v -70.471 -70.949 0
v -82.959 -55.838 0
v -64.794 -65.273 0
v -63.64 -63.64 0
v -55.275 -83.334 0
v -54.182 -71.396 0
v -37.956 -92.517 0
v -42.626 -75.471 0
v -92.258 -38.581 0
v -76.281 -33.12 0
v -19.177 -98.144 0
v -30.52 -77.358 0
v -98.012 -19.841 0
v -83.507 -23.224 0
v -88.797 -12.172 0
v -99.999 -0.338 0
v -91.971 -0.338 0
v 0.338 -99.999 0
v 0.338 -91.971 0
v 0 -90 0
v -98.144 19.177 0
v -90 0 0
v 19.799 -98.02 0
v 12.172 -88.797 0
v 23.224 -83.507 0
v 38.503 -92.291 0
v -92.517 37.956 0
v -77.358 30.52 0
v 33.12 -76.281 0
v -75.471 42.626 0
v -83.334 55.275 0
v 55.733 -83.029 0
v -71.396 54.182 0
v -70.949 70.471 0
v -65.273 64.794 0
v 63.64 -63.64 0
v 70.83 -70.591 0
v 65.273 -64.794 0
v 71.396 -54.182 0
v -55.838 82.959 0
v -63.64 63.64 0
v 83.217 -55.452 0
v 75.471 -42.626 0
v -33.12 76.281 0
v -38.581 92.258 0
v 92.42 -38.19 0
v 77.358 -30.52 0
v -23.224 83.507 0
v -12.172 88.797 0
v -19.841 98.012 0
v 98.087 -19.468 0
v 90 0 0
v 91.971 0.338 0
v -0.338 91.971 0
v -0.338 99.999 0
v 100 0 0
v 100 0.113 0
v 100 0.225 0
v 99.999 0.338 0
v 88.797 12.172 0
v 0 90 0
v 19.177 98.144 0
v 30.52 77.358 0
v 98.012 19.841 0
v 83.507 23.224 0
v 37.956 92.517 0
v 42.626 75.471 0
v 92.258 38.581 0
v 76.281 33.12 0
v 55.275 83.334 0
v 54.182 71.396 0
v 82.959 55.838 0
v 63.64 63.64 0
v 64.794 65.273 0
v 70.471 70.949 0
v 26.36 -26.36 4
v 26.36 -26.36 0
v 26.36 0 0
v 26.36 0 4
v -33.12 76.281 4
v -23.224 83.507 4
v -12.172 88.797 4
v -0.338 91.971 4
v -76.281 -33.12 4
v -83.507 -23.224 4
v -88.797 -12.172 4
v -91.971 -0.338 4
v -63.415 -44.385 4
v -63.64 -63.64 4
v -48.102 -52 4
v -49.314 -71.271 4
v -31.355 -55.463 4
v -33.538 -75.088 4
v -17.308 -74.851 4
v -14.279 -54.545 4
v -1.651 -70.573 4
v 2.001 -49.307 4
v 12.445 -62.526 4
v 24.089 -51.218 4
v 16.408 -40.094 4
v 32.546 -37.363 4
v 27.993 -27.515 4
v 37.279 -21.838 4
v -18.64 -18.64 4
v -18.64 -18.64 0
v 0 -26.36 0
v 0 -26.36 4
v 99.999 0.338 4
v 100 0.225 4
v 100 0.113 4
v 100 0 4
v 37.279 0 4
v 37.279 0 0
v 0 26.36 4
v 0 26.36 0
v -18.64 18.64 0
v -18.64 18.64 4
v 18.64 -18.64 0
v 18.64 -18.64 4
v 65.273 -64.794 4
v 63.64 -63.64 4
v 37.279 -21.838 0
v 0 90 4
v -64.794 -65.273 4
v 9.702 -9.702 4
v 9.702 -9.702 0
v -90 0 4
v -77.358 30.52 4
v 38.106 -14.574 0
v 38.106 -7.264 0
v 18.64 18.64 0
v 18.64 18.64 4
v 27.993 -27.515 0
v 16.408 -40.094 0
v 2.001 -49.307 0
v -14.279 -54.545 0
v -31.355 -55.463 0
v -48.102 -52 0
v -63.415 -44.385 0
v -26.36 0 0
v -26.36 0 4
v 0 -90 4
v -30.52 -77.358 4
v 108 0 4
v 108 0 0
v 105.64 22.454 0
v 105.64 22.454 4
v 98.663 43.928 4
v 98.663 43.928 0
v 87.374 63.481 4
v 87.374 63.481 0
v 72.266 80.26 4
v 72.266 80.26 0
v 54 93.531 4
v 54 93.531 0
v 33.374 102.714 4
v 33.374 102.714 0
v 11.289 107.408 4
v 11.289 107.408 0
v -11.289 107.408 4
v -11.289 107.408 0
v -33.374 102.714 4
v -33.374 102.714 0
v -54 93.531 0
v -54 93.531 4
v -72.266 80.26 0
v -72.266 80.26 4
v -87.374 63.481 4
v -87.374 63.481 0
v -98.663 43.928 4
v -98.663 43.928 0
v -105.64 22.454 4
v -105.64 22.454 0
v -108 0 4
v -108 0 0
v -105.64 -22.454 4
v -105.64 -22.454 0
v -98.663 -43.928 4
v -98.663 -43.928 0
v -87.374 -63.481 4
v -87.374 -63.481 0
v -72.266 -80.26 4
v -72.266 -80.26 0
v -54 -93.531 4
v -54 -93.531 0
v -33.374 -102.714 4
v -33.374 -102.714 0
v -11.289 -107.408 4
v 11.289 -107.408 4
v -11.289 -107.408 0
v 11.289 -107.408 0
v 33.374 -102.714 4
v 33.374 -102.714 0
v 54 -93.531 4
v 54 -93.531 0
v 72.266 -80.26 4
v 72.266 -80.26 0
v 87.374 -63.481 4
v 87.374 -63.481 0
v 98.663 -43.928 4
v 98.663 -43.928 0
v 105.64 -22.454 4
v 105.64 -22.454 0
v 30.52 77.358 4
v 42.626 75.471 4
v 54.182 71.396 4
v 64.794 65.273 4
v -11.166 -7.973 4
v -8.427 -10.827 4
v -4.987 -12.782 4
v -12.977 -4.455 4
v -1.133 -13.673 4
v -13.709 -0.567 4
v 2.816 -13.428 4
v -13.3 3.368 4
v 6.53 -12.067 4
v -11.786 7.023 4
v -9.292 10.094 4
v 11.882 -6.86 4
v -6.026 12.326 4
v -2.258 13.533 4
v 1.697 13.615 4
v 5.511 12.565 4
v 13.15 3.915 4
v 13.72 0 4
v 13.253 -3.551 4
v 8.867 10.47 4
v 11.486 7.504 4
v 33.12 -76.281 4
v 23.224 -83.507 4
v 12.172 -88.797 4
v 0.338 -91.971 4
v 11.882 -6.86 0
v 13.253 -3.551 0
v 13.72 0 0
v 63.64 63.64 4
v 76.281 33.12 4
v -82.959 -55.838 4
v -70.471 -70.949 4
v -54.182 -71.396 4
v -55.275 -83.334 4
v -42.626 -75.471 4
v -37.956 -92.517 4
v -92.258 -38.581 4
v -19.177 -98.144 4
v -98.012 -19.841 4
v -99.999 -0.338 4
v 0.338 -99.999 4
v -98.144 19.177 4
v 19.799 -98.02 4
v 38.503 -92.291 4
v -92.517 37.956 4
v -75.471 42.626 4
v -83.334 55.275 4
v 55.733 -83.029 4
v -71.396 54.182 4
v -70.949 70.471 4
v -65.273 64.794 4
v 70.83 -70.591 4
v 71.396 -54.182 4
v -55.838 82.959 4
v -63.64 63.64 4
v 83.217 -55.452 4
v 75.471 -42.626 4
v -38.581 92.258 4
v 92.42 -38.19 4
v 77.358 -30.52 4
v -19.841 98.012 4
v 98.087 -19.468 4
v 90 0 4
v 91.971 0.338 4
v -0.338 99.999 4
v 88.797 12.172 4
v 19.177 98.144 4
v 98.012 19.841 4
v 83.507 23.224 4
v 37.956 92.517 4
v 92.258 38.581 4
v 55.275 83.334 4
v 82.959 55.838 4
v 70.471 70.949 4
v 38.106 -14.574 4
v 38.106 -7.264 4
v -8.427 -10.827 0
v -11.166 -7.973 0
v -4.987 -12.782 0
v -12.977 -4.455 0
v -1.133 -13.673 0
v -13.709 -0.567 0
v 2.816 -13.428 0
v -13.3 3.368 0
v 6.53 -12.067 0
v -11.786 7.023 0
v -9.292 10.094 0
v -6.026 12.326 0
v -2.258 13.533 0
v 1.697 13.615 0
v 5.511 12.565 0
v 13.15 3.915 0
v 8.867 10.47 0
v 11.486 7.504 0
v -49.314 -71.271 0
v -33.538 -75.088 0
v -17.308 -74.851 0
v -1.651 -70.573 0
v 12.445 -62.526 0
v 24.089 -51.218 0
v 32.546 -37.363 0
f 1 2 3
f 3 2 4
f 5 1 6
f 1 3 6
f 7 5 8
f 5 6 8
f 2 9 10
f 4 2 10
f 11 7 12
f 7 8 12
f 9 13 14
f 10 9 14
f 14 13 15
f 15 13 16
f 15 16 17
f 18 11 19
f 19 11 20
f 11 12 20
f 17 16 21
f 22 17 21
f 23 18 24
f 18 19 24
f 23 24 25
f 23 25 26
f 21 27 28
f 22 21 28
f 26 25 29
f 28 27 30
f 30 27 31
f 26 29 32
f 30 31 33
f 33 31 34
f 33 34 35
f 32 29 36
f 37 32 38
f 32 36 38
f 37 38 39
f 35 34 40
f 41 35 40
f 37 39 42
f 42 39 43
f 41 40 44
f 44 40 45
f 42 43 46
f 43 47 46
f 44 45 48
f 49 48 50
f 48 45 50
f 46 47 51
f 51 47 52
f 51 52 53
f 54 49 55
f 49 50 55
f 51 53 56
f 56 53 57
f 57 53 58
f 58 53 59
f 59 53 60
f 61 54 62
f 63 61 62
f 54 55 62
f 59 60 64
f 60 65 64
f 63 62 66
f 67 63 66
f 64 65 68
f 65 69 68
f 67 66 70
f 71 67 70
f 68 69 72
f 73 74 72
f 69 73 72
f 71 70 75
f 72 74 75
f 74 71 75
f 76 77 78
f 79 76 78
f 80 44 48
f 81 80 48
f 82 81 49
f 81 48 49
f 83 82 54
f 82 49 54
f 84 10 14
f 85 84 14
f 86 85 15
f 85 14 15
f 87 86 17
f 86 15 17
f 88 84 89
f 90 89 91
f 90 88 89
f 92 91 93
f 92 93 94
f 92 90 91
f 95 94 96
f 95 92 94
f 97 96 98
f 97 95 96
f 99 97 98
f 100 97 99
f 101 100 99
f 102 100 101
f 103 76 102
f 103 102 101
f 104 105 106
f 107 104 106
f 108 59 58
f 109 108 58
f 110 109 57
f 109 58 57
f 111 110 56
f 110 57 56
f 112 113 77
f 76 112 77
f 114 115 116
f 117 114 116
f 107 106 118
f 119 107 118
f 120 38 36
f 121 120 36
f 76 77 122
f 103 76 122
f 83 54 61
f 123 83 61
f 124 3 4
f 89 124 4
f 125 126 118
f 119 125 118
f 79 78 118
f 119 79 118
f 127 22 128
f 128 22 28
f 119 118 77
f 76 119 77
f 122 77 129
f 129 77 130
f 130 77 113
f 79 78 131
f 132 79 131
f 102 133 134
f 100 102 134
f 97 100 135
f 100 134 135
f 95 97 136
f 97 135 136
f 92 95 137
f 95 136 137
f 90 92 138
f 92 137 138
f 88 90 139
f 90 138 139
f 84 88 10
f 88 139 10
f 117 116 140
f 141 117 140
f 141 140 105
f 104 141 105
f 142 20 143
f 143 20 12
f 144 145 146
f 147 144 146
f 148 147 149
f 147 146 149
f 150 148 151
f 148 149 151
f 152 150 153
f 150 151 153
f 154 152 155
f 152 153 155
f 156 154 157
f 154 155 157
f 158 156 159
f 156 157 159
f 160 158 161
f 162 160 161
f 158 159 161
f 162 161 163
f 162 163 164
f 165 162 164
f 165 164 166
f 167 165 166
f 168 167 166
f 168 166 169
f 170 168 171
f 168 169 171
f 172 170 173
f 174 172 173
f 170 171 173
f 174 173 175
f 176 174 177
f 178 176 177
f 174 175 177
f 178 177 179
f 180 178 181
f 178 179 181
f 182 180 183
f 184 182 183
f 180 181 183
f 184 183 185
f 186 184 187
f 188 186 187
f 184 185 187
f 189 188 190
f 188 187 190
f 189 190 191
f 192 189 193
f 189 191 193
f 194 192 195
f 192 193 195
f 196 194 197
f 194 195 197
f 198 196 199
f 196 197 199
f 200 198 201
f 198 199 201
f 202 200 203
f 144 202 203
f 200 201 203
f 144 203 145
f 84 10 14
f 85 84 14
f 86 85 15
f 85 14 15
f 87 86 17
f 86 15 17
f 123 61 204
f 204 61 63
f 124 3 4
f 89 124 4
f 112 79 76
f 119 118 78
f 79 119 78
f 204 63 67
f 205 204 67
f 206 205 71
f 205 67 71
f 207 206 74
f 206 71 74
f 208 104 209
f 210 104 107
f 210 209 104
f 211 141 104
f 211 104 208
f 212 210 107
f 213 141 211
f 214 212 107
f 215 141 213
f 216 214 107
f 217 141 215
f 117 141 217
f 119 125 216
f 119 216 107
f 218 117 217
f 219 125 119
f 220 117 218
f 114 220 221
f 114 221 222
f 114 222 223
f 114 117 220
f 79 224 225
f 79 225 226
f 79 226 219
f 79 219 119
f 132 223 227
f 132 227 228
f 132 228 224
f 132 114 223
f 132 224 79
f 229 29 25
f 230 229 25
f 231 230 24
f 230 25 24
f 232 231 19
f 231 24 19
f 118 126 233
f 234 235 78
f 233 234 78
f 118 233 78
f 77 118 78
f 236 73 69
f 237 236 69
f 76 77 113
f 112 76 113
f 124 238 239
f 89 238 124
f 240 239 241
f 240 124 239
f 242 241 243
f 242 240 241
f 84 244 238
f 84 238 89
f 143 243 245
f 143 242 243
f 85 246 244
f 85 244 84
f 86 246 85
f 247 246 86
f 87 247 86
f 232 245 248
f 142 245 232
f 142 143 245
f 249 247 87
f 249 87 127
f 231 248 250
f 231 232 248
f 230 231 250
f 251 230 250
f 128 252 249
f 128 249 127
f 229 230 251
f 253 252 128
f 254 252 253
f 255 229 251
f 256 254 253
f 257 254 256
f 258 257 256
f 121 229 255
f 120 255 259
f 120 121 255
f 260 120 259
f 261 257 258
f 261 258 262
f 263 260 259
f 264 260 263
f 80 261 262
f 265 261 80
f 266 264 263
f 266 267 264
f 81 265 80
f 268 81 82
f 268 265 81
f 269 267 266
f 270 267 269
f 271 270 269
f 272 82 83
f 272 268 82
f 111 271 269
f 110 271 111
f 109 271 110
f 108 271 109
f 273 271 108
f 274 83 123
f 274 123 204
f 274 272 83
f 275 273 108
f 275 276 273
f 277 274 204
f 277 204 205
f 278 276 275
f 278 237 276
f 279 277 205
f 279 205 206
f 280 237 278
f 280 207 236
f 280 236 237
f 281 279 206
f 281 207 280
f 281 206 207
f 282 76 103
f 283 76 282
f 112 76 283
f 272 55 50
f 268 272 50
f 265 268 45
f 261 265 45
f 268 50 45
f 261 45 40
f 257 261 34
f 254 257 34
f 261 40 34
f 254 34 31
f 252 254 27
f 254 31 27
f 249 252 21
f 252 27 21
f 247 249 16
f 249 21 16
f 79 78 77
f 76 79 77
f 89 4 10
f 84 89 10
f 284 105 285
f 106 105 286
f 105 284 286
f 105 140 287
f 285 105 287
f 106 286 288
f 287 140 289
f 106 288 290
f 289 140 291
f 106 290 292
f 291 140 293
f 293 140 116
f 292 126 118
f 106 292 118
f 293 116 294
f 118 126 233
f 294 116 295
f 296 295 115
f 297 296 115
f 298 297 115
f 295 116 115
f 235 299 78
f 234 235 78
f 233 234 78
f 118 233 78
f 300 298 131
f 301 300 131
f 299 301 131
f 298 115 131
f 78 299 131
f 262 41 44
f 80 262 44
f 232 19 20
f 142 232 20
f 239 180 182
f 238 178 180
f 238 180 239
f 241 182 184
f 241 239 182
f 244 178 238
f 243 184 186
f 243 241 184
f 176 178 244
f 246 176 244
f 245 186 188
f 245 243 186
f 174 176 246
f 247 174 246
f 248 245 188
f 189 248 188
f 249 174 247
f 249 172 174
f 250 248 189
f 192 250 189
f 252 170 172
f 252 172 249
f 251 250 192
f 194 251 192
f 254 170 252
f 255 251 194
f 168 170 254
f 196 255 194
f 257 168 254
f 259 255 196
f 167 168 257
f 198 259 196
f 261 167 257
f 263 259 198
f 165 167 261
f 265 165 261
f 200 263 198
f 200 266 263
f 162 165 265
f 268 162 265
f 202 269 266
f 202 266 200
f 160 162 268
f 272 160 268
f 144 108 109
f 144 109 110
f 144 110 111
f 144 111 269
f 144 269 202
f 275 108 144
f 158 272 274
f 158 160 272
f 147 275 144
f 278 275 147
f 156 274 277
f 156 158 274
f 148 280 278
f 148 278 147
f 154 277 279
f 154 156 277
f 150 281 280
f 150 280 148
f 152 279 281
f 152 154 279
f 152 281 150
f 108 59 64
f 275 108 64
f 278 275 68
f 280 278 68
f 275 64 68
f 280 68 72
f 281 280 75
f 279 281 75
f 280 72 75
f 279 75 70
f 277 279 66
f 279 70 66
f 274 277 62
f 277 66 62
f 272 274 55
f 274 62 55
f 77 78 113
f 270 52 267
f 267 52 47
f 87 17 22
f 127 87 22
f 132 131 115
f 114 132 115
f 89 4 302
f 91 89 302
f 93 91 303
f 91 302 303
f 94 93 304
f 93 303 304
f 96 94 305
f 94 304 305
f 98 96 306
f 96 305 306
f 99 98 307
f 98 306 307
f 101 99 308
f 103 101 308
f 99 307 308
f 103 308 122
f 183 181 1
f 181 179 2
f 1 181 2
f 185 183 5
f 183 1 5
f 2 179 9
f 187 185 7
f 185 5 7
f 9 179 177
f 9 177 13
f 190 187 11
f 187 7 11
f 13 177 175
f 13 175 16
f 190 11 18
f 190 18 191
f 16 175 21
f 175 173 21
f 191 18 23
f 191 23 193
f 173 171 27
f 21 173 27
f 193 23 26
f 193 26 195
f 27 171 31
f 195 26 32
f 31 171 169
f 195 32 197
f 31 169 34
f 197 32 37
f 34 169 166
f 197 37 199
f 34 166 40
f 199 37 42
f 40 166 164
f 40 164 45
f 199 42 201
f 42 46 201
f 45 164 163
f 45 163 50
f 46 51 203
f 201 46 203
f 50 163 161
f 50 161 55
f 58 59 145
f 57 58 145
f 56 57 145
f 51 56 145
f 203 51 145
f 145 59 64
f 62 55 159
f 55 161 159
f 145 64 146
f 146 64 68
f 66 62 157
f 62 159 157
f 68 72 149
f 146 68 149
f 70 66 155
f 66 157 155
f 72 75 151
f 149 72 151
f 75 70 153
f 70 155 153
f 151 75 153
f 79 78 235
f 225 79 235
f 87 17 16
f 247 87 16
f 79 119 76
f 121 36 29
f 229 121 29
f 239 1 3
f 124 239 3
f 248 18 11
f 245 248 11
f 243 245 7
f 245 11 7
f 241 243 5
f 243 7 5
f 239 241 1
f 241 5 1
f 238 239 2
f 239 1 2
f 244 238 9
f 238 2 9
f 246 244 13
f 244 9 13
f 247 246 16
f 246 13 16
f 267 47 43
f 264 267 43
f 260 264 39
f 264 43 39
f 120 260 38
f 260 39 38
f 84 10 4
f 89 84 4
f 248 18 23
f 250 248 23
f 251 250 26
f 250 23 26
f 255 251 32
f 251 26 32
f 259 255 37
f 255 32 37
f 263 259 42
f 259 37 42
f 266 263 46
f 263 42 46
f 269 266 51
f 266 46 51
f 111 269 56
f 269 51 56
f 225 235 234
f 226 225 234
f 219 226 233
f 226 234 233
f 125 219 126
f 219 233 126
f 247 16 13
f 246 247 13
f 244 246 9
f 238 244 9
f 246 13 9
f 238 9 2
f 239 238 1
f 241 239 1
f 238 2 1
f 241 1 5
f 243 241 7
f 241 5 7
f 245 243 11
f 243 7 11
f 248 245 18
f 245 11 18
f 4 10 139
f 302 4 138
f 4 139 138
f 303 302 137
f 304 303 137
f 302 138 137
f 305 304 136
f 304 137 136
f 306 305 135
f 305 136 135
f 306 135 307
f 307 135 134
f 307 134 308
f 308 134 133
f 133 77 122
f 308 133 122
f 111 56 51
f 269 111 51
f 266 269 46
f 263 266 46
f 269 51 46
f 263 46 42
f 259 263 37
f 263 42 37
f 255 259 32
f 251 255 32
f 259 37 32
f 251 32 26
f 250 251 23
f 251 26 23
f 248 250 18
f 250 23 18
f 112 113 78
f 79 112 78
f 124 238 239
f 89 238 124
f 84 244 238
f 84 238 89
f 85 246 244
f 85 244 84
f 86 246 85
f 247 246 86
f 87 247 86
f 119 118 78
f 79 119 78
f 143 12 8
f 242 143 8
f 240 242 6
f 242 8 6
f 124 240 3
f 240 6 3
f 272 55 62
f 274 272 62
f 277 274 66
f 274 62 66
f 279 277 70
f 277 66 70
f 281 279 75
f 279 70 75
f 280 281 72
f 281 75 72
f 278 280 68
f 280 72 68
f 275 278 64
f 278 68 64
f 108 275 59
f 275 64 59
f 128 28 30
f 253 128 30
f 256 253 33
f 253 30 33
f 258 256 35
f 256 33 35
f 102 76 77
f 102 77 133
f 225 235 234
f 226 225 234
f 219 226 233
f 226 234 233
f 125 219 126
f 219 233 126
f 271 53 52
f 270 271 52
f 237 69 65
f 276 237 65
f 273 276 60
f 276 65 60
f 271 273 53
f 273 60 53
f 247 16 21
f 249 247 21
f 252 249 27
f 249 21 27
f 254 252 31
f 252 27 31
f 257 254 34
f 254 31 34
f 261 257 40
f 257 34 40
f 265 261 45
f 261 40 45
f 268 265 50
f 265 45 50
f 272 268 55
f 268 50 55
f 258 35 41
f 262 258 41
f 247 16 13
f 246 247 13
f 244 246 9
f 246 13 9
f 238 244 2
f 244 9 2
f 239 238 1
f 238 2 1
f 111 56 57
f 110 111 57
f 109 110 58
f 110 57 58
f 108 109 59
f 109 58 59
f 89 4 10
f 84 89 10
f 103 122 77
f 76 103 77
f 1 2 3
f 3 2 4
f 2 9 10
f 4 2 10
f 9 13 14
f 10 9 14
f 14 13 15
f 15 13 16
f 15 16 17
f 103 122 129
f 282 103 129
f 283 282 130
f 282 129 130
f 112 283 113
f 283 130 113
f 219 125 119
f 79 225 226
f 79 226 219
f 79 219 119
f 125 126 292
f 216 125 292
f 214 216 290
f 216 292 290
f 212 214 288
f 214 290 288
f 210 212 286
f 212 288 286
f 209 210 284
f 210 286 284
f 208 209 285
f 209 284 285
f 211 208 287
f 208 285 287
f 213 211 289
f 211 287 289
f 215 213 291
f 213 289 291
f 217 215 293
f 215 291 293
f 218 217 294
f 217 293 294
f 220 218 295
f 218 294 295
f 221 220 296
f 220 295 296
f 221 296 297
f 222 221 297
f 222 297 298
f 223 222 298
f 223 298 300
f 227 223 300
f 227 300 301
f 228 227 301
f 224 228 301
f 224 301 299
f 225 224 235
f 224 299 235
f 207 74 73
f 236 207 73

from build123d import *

# Parameters (mm, degrees)
F2_DEPTH  = 4
F3_DEPTH  = 4
F4_DEPTH  = 4
F5_DEPTH  = 4
F6_DEPTH  = 4
F7_DEPTH  = 4
F8_DEPTH  = 4
F9_DEPTH  = 4
F1_R      = 108
F10_DEPTH = 4


with BuildPart() as f2:
    # F1 (on Top) → F2 (new body)
    with BuildSketch(Plane.XY):
        with BuildLine():
            Line((91.9711971193, 0.3382039575), (99.9994280888, 0.3382039575))
            ThreePointArc((99.9994280888, 0.3382039575), (92.2579998228, 38.5805840897), (70.4711274046, 70.9494200281))
            Line((70.4711274046, 70.9494200281), (64.7943108452, 65.2726034686))
            Line((64.7943108452, 65.2726034686), (63.6396103068, 63.6396103068))
            Line((63.6396103068, 63.6396103068), (76.2813507115, 33.1197491698))
            ThreePointArc((76.2813507115, 33.1197491698), (86.4066619055, 17.8204119149), (91.9711971193, 0.3382039575))
        make_face()
        with BuildLine():
            Line((64.7943108452, 65.2726034686), (70.4711274046, 70.9494200281))
            ThreePointArc((70.4711274046, 70.9494200281), (37.9556646615, 92.5168499253), (-0.3382039575, 99.9994280888))
            Line((-0.3382039575, 99.9994280888), (-0.3382039575, 91.9711971193))
            Line((-0.3382039575, 91.9711971193), (0, 90))
            Line((0, 90), (30.519861137, 77.3582595953))
            ThreePointArc((30.519861137, 77.3582595953), (48.4978024645, 73.6996706817), (64.7943108452, 65.2726034686))
        make_face()
        with BuildLine():
            Line((-0.3382039575, 91.9711971193), (-0.3382039575, 99.9994280888))
            ThreePointArc((-0.3382039575, 99.9994280888), (-38.5805840897, 92.2579998228), (-70.9494200281, 70.4711274046))
            Line((-70.9494200281, 70.4711274046), (-65.2726034686, 64.7943108452))
            Line((-65.2726034686, 64.7943108452), (-63.6396103068, 63.6396103068))
            Line((-63.6396103068, 63.6396103068), (-33.1197491698, 76.2813507115))
            ThreePointArc((-33.1197491698, 76.2813507115), (-17.8204119149, 86.4066619055), (-0.3382039575, 91.9711971193))
        make_face()
        with BuildLine():
            Line((-65.2726034686, 64.7943108452), (-70.9494200281, 70.4711274046))
            ThreePointArc((-70.9494200281, 70.4711274046), (-92.5168499253, 37.9556646615), (-99.9994280888, -0.3382039575))
            Line((-99.9994280888, -0.3382039575), (-91.9711971193, -0.3382039575))
            Line((-91.9711971193, -0.3382039575), (-90, 0))
            Line((-90, 0), (-77.3582595953, 30.519861137))
            ThreePointArc((-77.3582595953, 30.519861137), (-73.6996706817, 48.4978024645), (-65.2726034686, 64.7943108452))
        make_face()
        with BuildLine():
            ThreePointArc((-99.9994280888, -0.3382039575), (-92.2579998228, -38.5805840897), (-70.4711274046, -70.9494200281))
            Line((-70.4711274046, -70.9494200281), (-64.7943108452, -65.2726034686))
            Line((-64.7943108452, -65.2726034686), (-63.6396103068, -63.6396103068))
            Line((-63.6396103068, -63.6396103068), (-76.2813507115, -33.1197491698))
            ThreePointArc((-76.2813507115, -33.1197491698), (-86.4066619055, -17.8204119149), (-91.9711971193, -0.3382039575))
            Line((-91.9711971193, -0.3382039575), (-99.9994280888, -0.3382039575))
        make_face()
        with BuildLine():
            ThreePointArc((-70.4711274046, -70.9494200281), (-37.9556646615, -92.5168499253), (0.3382039575, -99.9994280888))
            Line((0.3382039575, -99.9994280888), (0.3382039575, -91.9711971193))
            Line((0.3382039575, -91.9711971193), (0, -90))
            Line((0, -90), (-30.519861137, -77.3582595953))
            ThreePointArc((-30.519861137, -77.3582595953), (-48.4978024645, -73.6996706817), (-64.7943108452, -65.2726034686))
            Line((-64.7943108452, -65.2726034686), (-70.4711274046, -70.9494200281))
        make_face()
        with BuildLine():
            ThreePointArc((0.3382039575, -99.9994280888), (38.5805840897, -92.2579998228), (70.9494200281, -70.4711274046))
            Line((70.9494200281, -70.4711274046), (65.2726034686, -64.7943108452))
            Line((65.2726034686, -64.7943108452), (63.6396103068, -63.6396103068))
            Line((63.6396103068, -63.6396103068), (33.1197491698, -76.2813507115))
            ThreePointArc((33.1197491698, -76.2813507115), (17.8204119149, -86.4066619055), (0.3382039575, -91.9711971193))
            Line((0.3382039575, -91.9711971193), (0.3382039575, -99.9994280888))
        make_face()
        with BuildLine():
            ThreePointArc((70.9494200281, -70.4711274046), (92.4525337749, -38.1120584408), (100, 0))
            ThreePointArc((100, 0), (99.9998570221, 0.1691022205), (99.9994280888, 0.3382039575))
            Line((99.9994280888, 0.3382039575), (91.9711971193, 0.3382039575))
            Line((91.9711971193, 0.3382039575), (90, 0))
            Line((90, 0), (77.3582595953, -30.519861137))
            ThreePointArc((77.3582595953, -30.519861137), (73.6996706817, -48.4978024645), (65.2726034686, -64.7943108452))
            Line((65.2726034686, -64.7943108452), (70.9494200281, -70.4711274046))
        make_face()
    extrude(amount=F2_DEPTH)


with BuildPart() as f3:
    # F1 (on Top) → F3 (new body)
    with BuildSketch(Plane.XY):
        with BuildLine():
            Line((-76.2813507115, -33.1197491698), (-63.6396103068, -63.6396103068))
            ThreePointArc((-63.6396103068, -63.6396103068), (-1.6507102116, -70.5732742468), (37.2792206136, -21.8376618407))
            Line((37.2792206136, -21.8376618407), (26.3603896932, -26.3603896932))
            Line((26.3603896932, -26.3603896932), (27.9933828551, -27.5150902316))
            ThreePointArc((27.9933828551, -27.5150902316), (-22.7875050087, -55.554723072), (-76.2813507115, -33.1197491698))
        make_face()
    extrude(amount=F3_DEPTH)


with BuildPart() as f4:
    # F1 (on Top) → F4 (new body)
    with BuildSketch(Plane.XY):
        with BuildLine():
            Line((26.3603896932, -26.3603896932), (37.2792206136, -21.8376618407))
            ThreePointArc((37.2792206136, -21.8376618407), (38.2091144761, -10.9188309204), (37.2792206136, 0))
            Line((37.2792206136, 0), (26.3603896932, -26.3603896932))
        make_face()
    extrude(amount=F4_DEPTH)


with BuildPart() as f5:
    # F1 (on Top) → F5 (new body)
    with BuildSketch(Plane.XY):
        Polygon((26.3603896932, -26.3603896932), (37.2792206136, 0), (26.3603896932, 0), align=None)
    extrude(amount=F5_DEPTH)


with BuildPart() as f6:
    # F1 (on Top) → F6 (new body)
    with BuildSketch(Plane.XY):
        Polygon((18.6396103068, -18.6396103068), (26.3603896932, -26.3603896932), (26.3603896932, 0), align=None)
    extrude(amount=F6_DEPTH)


with BuildPart() as f7:
    # F1 (on Top) → F7 (new body)
    with BuildSketch(Plane.XY):
        with BuildLine():
            Line((0, 26.3603896932), (-18.6396103068, 18.6396103068))
            Line((-18.6396103068, 18.6396103068), (-26.3603896932, 0))
            Line((-26.3603896932, 0), (-18.6396103068, -18.6396103068))
            Line((-18.6396103068, -18.6396103068), (0, -26.3603896932))
            Line((0, -26.3603896932), (18.6396103068, -18.6396103068))
            Line((18.6396103068, -18.6396103068), (9.7017045802, -9.7017045802))
            ThreePointArc((9.7017045802, -9.7017045802), (-12.6758879006, 5.2505246836), (13.7202821954, 0))
            Line((13.7202821954, 0), (26.3603896932, 0))
            Line((26.3603896932, 0), (18.6396103068, 18.6396103068))
            Line((18.6396103068, 18.6396103068), (0, 26.3603896932))
        make_face()
        with BuildLine():
            Line((18.6396103068, -18.6396103068), (26.3603896932, 0))
            Line((26.3603896932, 0), (13.7202821954, 0))
            ThreePointArc((13.7202821954, 0), (12.6758879006, -5.2505246836), (9.7017045802, -9.7017045802))
            Line((9.7017045802, -9.7017045802), (18.6396103068, -18.6396103068))
        make_face()
    extrude(amount=F7_DEPTH)


with BuildPart() as f8:
    # F1 (on Top) → F8 (new body)
    with BuildSketch(Plane.XY):
        with BuildLine():
            ThreePointArc((-99.9994280888, -0.3382039575), (-92.2579998228, -38.5805840897), (-70.4711274046, -70.9494200281))
            Line((-70.4711274046, -70.9494200281), (-64.7943108452, -65.2726034686))
            Line((-64.7943108452, -65.2726034686), (-63.6396103068, -63.6396103068))
            Line((-63.6396103068, -63.6396103068), (-76.2813507115, -33.1197491698))
            ThreePointArc((-76.2813507115, -33.1197491698), (-86.4066619055, -17.8204119149), (-91.9711971193, -0.3382039575))
            Line((-91.9711971193, -0.3382039575), (-99.9994280888, -0.3382039575))
        make_face()
    extrude(amount=F8_DEPTH)


with BuildPart() as f9:
    # F1 (on Top) → F9 (new body)
    with BuildSketch(Plane.XY):
        with BuildLine():
            Line((18.6396103068, -18.6396103068), (26.3603896932, 0))
            Line((26.3603896932, 0), (13.7202821954, 0))
            ThreePointArc((13.7202821954, 0), (12.6758879006, -5.2505246836), (9.7017045802, -9.7017045802))
            Line((9.7017045802, -9.7017045802), (18.6396103068, -18.6396103068))
        make_face()
    extrude(amount=F9_DEPTH)


with BuildPart() as f10:
    # F1 (on Top) → F10 (new body)
    with BuildSketch(Plane.XY):
        Circle(F1_R)
        with BuildLine():
            ThreePointArc((99.9994280888, 0.3382039575), (99.9998570221, 0.1691022205), (100, 0))
            ThreePointArc((100, 0), (92.4525337749, -38.1120584408), (70.9494200281, -70.4711274046))
            ThreePointArc((70.9494200281, -70.4711274046), (38.5805840897, -92.2579998228), (0.3382039575, -99.9994280888))
            ThreePointArc((0.3382039575, -99.9994280888), (-37.9556646615, -92.5168499253), (-70.4711274046, -70.9494200281))
            ThreePointArc((-70.4711274046, -70.9494200281), (-92.2579998228, -38.5805840897), (-99.9994280888, -0.3382039575))
            ThreePointArc((-99.9994280888, -0.3382039575), (-92.5168499253, 37.9556646615), (-70.9494200281, 70.4711274046))
            ThreePointArc((-70.9494200281, 70.4711274046), (-38.5805840897, 92.2579998228), (-0.3382039575, 99.9994280888))
            ThreePointArc((-0.3382039575, 99.9994280888), (37.9556646615, 92.5168499253), (70.4711274046, 70.9494200281))
            ThreePointArc((70.4711274046, 70.9494200281), (92.2579998228, 38.5805840897), (99.9994280888, 0.3382039575))
        make_face(mode=Mode.SUBTRACT)
    extrude(amount=F10_DEPTH)


solid = Compound([f2.part, f3.part, f4.part, f5.part, f6.part, f7.part, f8.part, f9.part, f10.part])
